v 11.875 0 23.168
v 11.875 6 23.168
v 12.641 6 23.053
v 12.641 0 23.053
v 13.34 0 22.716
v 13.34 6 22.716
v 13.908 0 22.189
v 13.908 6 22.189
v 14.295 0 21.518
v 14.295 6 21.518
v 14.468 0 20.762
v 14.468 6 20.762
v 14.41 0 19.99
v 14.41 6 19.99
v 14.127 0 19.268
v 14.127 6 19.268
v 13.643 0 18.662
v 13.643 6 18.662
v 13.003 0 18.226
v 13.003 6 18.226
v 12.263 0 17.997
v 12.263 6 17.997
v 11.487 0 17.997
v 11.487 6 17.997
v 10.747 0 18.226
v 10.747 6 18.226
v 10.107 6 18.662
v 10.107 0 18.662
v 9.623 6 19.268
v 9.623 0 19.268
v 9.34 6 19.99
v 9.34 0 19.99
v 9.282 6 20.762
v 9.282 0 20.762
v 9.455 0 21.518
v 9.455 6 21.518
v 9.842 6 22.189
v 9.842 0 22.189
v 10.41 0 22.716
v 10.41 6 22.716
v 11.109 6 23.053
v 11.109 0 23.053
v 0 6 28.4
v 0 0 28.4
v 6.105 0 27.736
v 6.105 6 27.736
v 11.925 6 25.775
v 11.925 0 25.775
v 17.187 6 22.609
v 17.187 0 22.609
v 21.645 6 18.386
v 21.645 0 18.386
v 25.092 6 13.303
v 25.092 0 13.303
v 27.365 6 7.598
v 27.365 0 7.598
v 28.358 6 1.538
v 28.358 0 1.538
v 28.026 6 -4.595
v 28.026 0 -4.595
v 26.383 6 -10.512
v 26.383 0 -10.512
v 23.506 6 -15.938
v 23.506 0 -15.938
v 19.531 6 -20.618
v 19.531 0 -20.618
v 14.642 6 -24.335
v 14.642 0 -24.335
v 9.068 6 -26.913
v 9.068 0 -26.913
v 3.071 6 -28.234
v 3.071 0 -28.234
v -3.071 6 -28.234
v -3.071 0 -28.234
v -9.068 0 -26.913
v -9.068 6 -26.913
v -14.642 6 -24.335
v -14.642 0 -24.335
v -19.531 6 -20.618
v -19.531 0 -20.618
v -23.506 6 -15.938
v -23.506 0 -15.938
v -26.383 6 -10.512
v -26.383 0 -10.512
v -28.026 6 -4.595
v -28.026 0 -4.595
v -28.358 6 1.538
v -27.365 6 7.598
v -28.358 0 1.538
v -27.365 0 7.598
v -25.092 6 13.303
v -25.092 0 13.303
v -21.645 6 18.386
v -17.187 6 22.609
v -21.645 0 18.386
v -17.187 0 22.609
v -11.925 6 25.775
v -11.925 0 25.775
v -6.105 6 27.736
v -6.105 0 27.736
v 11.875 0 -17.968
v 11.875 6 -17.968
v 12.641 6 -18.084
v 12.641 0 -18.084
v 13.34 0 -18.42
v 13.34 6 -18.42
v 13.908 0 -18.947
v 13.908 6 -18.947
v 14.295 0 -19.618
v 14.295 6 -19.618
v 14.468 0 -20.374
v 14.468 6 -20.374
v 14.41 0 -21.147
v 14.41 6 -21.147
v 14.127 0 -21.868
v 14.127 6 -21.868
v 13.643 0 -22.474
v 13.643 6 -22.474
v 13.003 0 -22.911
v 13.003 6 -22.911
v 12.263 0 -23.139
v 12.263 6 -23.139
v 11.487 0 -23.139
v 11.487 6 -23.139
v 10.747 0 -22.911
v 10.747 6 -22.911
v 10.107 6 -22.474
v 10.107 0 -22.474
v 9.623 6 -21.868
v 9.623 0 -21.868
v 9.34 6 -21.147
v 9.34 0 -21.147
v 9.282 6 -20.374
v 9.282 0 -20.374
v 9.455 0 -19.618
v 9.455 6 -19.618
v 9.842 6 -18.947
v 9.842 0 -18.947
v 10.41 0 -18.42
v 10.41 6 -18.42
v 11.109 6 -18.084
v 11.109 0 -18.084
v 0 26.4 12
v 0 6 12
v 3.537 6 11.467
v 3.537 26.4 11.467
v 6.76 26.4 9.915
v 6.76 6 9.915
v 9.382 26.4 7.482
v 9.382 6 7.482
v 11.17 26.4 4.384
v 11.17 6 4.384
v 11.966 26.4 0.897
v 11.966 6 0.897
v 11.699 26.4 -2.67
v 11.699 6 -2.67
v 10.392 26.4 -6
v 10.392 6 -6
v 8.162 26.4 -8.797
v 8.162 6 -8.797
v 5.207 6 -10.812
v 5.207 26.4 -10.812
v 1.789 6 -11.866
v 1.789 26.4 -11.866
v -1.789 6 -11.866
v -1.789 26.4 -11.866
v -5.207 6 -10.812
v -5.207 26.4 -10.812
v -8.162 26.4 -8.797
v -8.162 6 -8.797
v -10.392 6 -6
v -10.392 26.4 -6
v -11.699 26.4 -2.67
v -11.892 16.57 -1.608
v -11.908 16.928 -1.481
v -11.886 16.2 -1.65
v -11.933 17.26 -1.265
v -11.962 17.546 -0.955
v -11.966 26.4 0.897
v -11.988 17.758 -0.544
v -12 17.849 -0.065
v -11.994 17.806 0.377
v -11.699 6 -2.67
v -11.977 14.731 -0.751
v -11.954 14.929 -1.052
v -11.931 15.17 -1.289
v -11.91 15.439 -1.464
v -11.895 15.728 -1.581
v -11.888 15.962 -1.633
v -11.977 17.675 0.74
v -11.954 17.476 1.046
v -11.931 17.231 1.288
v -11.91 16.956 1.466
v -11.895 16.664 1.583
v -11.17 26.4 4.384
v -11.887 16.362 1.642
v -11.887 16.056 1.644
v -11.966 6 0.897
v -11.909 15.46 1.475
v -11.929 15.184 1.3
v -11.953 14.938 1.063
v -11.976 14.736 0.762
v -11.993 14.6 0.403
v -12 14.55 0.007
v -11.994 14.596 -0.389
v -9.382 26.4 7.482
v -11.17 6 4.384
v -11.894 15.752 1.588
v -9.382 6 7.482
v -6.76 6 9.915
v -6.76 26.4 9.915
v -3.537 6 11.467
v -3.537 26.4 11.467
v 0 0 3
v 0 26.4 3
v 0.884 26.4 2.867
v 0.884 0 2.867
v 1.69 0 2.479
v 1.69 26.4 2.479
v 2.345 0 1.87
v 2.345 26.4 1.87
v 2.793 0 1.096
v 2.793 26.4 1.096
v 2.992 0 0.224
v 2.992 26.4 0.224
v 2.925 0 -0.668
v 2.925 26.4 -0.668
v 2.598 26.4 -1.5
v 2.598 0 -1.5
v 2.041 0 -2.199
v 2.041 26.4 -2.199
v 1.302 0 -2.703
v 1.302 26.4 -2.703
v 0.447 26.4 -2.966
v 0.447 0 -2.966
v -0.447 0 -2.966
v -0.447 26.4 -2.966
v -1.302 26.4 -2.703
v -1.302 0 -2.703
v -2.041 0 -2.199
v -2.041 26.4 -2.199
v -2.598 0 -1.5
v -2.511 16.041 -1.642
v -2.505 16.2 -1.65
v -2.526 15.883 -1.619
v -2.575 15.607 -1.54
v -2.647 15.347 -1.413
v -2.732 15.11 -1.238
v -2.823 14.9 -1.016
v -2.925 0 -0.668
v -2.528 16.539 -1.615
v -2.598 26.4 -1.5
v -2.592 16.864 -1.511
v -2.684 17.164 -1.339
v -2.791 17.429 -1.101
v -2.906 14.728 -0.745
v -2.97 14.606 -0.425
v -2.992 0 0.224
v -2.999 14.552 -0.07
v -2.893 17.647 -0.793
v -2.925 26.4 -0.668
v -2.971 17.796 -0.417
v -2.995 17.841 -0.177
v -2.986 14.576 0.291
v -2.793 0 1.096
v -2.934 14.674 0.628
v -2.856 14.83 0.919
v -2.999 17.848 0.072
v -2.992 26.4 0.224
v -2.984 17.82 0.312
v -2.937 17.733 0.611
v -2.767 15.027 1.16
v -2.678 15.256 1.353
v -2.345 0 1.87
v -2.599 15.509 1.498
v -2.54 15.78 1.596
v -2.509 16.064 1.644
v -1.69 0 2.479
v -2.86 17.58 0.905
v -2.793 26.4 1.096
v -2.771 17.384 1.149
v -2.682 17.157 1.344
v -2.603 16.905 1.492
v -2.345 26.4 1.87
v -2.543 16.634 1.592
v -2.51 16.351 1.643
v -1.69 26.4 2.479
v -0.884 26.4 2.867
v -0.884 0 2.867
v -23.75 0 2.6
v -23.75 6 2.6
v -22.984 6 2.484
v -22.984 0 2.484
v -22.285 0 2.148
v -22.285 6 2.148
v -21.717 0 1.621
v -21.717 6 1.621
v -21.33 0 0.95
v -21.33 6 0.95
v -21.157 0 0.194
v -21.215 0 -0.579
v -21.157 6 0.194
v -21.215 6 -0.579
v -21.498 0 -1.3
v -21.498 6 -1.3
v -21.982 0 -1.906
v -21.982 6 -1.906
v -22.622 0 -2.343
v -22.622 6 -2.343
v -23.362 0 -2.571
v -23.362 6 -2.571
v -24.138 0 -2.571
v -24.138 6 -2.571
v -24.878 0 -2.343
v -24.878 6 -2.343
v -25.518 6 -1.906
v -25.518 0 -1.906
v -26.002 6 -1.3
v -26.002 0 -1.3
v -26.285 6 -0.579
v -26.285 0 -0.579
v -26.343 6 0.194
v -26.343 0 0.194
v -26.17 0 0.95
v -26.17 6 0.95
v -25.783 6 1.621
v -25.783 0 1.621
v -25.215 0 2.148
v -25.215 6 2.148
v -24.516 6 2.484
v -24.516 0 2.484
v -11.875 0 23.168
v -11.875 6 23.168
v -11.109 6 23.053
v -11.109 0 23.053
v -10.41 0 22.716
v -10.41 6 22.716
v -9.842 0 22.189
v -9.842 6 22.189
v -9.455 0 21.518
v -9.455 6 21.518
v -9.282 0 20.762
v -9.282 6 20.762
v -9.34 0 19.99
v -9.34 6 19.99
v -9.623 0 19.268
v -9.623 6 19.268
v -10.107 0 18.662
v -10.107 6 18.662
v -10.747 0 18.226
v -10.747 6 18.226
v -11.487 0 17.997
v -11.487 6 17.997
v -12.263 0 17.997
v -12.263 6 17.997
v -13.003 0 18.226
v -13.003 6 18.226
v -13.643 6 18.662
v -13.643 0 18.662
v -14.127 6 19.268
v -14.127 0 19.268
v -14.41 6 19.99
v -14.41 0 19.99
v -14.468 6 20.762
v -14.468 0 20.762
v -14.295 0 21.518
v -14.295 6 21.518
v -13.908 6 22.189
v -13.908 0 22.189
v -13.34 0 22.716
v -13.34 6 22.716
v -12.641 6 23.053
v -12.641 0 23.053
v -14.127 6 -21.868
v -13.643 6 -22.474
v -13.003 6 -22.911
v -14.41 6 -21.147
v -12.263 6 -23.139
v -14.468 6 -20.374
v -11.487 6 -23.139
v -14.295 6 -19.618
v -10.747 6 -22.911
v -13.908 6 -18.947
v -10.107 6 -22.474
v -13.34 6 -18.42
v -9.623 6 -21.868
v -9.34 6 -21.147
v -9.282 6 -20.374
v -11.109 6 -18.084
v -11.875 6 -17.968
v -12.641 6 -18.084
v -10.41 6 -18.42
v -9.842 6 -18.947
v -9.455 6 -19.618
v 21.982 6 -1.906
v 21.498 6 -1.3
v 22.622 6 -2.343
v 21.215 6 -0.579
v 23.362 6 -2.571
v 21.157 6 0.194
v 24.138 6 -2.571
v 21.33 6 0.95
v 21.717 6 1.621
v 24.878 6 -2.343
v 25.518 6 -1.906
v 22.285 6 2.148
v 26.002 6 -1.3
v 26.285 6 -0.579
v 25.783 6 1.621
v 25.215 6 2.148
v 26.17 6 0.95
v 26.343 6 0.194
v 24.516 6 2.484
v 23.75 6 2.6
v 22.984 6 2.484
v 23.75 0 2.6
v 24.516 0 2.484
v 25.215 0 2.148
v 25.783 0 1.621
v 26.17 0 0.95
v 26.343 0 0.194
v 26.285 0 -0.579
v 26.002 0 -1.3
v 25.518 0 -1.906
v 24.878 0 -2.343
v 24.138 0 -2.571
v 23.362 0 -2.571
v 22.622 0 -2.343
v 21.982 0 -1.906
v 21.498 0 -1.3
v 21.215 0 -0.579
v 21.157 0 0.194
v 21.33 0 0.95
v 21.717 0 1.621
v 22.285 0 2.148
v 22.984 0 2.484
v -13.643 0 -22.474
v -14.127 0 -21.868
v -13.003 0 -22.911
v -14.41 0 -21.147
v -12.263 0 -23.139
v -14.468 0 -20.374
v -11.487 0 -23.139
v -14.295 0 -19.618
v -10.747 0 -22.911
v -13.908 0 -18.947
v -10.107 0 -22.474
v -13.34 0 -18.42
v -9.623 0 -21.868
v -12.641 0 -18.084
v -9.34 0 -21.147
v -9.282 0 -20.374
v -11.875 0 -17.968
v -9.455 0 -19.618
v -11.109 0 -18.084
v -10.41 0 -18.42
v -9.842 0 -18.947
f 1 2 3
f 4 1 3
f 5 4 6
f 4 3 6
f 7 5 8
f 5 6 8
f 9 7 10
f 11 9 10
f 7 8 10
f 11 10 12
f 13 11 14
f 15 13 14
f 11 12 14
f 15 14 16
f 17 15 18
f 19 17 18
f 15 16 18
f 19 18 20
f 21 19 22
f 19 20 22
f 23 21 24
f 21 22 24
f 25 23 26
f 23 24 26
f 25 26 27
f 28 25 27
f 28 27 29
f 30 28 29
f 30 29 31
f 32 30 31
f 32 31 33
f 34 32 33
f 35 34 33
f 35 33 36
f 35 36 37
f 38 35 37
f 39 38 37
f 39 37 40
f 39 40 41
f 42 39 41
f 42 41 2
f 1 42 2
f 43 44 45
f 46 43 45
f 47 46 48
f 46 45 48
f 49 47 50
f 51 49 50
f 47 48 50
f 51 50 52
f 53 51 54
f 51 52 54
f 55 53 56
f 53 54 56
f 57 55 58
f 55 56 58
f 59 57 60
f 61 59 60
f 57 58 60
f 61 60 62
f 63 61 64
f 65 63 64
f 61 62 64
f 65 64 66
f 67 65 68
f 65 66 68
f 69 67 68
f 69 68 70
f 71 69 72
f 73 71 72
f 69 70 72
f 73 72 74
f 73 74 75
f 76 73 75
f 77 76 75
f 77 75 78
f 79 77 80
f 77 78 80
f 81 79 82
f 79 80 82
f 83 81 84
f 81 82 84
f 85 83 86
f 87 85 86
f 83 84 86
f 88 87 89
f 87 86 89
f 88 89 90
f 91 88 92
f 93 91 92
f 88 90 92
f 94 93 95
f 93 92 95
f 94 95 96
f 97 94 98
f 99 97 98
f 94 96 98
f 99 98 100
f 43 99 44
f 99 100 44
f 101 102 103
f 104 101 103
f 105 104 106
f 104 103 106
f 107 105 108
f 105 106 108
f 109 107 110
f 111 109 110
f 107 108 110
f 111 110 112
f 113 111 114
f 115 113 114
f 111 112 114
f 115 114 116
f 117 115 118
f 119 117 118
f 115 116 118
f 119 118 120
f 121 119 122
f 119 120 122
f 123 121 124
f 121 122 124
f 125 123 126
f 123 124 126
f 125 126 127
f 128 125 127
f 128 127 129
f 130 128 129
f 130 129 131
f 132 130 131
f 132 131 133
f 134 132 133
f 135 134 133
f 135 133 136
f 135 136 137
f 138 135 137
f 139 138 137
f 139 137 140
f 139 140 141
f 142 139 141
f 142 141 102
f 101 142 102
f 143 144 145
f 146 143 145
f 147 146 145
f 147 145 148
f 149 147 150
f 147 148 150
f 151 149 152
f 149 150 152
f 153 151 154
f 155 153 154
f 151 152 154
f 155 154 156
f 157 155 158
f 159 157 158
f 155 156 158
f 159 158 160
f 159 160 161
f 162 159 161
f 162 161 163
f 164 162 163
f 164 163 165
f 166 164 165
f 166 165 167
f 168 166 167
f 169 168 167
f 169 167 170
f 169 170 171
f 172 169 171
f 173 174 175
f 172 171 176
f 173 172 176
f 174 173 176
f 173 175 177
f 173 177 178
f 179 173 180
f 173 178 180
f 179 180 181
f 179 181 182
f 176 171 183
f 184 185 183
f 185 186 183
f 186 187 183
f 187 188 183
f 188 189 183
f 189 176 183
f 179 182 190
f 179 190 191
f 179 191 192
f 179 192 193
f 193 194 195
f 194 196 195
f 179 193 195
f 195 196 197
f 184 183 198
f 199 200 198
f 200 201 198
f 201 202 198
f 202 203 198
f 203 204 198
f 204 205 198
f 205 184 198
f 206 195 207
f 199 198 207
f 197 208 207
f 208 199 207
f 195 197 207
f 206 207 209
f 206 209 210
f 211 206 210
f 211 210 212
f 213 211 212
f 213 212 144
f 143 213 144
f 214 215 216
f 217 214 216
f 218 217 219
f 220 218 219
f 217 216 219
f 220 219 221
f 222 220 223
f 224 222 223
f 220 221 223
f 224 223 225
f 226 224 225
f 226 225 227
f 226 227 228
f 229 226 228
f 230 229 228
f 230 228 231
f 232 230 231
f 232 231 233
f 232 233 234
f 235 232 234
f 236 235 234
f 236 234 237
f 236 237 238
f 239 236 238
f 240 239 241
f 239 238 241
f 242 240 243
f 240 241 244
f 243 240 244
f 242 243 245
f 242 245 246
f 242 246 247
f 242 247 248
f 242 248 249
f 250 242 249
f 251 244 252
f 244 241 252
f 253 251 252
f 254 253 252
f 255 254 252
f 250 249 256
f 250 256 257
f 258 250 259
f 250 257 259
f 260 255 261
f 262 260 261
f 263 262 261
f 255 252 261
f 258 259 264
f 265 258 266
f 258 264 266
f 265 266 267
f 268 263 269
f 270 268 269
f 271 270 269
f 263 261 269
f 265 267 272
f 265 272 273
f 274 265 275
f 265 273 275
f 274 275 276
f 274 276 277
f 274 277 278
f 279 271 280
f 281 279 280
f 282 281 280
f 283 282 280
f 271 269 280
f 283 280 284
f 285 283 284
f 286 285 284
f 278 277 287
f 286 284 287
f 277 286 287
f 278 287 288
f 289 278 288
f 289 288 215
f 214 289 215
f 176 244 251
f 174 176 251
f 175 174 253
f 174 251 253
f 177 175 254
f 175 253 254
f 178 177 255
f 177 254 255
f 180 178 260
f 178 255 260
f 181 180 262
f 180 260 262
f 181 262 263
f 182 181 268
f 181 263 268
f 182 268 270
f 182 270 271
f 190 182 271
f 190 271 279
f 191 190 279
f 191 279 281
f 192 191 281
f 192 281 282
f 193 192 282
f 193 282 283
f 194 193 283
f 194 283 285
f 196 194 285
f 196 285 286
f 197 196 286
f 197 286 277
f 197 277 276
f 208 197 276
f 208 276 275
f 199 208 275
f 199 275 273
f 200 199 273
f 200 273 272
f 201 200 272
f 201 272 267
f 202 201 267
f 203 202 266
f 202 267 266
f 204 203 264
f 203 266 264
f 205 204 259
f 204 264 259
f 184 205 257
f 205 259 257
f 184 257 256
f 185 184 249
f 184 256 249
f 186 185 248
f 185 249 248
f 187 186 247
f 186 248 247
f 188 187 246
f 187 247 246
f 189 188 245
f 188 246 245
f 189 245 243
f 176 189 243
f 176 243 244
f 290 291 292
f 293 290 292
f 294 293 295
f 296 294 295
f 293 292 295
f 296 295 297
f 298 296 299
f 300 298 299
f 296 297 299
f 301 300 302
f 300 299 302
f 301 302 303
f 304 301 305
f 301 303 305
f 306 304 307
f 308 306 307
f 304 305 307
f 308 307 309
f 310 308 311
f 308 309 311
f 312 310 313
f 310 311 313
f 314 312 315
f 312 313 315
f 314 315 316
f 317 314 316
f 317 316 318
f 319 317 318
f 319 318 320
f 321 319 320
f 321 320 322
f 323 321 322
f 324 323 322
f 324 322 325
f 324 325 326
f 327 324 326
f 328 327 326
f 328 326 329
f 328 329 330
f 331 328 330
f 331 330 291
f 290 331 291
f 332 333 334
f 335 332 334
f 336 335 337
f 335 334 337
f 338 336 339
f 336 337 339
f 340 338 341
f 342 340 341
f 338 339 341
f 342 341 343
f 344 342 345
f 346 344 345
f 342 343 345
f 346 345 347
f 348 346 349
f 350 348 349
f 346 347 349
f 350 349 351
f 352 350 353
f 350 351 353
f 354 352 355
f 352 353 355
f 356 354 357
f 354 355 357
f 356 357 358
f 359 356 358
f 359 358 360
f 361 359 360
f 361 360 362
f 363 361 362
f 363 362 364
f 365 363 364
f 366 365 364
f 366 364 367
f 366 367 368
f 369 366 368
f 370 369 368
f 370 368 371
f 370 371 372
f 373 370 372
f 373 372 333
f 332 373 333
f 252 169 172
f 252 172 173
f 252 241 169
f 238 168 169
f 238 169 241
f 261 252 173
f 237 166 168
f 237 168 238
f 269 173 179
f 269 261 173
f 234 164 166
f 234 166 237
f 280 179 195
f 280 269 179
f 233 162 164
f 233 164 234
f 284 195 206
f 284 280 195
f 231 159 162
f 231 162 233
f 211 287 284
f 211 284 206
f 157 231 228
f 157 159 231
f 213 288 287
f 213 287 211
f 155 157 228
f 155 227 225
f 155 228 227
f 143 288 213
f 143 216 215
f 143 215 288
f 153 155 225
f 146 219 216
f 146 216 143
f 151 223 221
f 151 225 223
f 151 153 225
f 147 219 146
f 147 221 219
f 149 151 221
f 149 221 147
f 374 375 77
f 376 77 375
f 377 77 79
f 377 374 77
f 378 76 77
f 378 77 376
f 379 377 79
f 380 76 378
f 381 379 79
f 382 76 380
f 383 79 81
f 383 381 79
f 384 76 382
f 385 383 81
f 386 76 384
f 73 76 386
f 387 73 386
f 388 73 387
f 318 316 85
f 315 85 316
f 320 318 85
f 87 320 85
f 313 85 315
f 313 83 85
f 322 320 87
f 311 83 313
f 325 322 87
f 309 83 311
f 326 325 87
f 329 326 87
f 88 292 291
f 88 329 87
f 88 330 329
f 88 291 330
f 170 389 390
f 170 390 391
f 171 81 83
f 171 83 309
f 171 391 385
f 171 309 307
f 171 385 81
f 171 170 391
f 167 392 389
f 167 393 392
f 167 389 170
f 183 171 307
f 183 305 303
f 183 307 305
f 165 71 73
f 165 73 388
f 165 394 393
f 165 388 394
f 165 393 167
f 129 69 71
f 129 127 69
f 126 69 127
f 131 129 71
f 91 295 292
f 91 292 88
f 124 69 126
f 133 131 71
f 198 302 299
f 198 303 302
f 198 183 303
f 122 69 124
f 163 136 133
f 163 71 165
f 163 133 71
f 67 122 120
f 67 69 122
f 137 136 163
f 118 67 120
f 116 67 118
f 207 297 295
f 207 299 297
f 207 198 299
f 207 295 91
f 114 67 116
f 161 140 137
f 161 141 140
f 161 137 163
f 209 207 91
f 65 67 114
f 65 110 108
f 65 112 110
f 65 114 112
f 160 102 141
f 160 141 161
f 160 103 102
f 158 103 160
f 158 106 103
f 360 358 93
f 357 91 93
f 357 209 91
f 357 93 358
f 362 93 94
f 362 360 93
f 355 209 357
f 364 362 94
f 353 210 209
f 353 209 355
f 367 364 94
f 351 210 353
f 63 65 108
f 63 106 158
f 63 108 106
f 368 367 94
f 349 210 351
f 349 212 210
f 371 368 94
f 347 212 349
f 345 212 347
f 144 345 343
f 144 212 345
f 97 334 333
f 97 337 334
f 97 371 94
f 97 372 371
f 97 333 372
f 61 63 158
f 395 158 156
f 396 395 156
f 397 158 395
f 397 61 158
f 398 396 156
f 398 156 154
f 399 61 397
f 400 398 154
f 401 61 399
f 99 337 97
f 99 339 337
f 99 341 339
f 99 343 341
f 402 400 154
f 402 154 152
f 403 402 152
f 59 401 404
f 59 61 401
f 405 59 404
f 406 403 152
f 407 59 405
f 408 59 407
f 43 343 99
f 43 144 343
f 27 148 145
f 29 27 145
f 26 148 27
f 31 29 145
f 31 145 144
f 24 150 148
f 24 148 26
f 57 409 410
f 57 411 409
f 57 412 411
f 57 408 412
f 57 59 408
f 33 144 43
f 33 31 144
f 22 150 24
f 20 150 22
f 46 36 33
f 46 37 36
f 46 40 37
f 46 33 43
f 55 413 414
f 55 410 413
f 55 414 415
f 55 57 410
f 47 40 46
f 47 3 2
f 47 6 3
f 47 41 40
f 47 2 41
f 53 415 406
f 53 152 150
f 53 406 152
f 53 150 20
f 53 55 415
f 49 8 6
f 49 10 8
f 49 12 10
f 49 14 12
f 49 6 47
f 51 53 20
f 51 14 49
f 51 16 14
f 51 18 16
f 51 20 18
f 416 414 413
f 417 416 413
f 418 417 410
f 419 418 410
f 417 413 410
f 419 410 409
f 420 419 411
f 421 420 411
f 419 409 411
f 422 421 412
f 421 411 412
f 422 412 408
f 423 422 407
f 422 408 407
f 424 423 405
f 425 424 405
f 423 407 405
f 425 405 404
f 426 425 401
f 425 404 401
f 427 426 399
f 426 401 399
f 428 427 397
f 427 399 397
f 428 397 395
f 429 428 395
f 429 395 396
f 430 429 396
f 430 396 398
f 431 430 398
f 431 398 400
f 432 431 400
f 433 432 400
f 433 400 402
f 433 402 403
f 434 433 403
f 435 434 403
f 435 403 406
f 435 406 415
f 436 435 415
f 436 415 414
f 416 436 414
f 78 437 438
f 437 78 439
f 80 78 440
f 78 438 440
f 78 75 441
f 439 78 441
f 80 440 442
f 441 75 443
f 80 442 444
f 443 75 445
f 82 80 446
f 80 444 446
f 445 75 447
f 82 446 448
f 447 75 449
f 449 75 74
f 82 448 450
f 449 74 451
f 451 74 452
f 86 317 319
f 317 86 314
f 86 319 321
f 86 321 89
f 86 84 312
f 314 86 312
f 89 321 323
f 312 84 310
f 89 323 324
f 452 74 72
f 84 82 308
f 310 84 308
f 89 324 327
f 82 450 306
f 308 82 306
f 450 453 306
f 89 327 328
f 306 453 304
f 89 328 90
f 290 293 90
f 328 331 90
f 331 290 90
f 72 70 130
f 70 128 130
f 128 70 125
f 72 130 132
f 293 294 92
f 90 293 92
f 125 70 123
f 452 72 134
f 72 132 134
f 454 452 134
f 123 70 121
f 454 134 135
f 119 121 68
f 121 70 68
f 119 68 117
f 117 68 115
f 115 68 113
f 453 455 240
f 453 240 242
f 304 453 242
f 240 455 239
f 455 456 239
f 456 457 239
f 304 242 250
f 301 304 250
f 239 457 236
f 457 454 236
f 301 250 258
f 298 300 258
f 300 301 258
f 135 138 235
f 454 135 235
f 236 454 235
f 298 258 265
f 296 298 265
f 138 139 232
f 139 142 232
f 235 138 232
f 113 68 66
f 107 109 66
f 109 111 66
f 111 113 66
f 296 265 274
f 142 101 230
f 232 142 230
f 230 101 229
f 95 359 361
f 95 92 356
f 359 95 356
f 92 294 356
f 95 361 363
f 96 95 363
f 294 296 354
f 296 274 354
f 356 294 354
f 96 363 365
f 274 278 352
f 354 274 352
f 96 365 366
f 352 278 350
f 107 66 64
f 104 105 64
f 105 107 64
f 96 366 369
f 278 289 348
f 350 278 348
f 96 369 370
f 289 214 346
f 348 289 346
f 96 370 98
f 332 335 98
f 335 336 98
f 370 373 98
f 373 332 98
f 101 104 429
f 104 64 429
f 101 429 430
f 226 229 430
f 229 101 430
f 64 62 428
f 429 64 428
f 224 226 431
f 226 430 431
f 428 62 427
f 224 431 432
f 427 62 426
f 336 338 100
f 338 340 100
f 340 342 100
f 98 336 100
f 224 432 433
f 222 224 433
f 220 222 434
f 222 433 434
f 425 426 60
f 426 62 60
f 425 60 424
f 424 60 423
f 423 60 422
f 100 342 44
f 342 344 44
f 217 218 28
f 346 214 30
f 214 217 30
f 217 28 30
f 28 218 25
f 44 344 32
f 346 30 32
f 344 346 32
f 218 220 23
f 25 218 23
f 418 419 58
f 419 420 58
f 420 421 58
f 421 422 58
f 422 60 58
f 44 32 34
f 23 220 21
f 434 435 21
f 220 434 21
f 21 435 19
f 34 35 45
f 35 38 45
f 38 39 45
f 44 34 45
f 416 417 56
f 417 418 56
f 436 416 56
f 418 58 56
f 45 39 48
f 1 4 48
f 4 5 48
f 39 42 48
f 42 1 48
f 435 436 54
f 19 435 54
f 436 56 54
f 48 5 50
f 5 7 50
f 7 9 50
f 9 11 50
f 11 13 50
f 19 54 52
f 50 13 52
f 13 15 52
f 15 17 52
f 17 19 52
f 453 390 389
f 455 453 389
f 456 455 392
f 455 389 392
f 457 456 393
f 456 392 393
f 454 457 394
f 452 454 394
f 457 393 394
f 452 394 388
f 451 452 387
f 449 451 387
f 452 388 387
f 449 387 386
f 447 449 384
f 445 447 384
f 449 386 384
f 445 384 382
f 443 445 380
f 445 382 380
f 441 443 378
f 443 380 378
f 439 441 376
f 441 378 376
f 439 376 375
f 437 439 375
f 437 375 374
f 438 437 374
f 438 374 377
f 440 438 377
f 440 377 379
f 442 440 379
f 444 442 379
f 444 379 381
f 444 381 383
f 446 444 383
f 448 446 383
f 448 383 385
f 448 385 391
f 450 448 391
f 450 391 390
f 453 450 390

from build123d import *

# Parameters (mm, degrees)
SKETCH1_R           = 28.399999969
BOSS_EXTRUDE1_DEPTH = 6
SKETCH2_R           = 12
BOSS_EXTRUDE2_DEPTH = 20.4
SKETCH3_R           = 3
CUT_EXTRUDE1_DEPTH  = 49.063291569
SKETCH4_R           = 2.6
CUT_EXTRUDE2_DEPTH  = 46.047530415
SKETCH6_R           = 1.65
CUT_EXTRUDE3_DEPTH  = 49.063291569


with BuildPart() as part:
    # Sketch1 → Boss-Extrude1 (new body)
    with BuildSketch(Plane(origin=(0, 0, 0), x_dir=(1, 0, 0), z_dir=(0, 1, 0))):
        with Locations(Location((0, 0, 0), (0, 0, 270))):
            Circle(SKETCH1_R)
    extrude(amount=BOSS_EXTRUDE1_DEPTH)

    # Sketch2 → Boss-Extrude2 (add)
    with BuildSketch(Plane(origin=(0, 6, 0), x_dir=(1, 0, 0), z_dir=(0, 1, 0))):
        with Locations(Location((0, 0, 0), (0, 0, 270))):
            Circle(SKETCH2_R)
    extrude(amount=BOSS_EXTRUDE2_DEPTH)

    # Sketch3 → Cut-Extrude1 (cut, through all)
    with BuildSketch(Plane(origin=(0, 26.4, 0), x_dir=(1, 0, 0), z_dir=(0, 1, 0))):
        with Locations(Location((0, 0, 0), (0, 0, 270))):
            Circle(SKETCH3_R)
    extrude(amount=-CUT_EXTRUDE1_DEPTH, mode=Mode.SUBTRACT)

    # Sketch4 → Cut-Extrude2 (cut, through all)
    with BuildSketch(Plane(origin=(0, 6, 0), x_dir=(1, 0, 0), z_dir=(0, 1, 0))):
        with Locations(Location((23.75, 0, 0), (0, 0, 270))):
            Circle(SKETCH4_R)
        with Locations(Location((11.875, -20.56810334, 0), (0, 0, 270))):
            Circle(SKETCH4_R)
        with Locations(Location((-11.875, -20.56810334, 0), (0, 0, 270))):
            Circle(SKETCH4_R)
        with Locations(Location((-23.75, 0, 0), (0, 0, 270))):
            Circle(SKETCH4_R)
        with Locations(Location((-11.875, 20.56810334, 0), (0, 0, 270))):
            Circle(SKETCH4_R)
        with Locations(Location((11.875, 20.56810334, 0), (0, 0, 270))):
            Circle(SKETCH4_R)
    extrude(amount=-CUT_EXTRUDE2_DEPTH, mode=Mode.SUBTRACT)

    # Sketch6 → Cut-Extrude3 (cut, through all)
    with BuildSketch(Plane(origin=(0, 0, 0), x_dir=(0, 0, -1), z_dir=(1, 0, 0))):
        with Locations((0, 16.2)):
            Circle(SKETCH6_R)
    extrude(amount=-CUT_EXTRUDE3_DEPTH, mode=Mode.SUBTRACT)


solid = part.part
